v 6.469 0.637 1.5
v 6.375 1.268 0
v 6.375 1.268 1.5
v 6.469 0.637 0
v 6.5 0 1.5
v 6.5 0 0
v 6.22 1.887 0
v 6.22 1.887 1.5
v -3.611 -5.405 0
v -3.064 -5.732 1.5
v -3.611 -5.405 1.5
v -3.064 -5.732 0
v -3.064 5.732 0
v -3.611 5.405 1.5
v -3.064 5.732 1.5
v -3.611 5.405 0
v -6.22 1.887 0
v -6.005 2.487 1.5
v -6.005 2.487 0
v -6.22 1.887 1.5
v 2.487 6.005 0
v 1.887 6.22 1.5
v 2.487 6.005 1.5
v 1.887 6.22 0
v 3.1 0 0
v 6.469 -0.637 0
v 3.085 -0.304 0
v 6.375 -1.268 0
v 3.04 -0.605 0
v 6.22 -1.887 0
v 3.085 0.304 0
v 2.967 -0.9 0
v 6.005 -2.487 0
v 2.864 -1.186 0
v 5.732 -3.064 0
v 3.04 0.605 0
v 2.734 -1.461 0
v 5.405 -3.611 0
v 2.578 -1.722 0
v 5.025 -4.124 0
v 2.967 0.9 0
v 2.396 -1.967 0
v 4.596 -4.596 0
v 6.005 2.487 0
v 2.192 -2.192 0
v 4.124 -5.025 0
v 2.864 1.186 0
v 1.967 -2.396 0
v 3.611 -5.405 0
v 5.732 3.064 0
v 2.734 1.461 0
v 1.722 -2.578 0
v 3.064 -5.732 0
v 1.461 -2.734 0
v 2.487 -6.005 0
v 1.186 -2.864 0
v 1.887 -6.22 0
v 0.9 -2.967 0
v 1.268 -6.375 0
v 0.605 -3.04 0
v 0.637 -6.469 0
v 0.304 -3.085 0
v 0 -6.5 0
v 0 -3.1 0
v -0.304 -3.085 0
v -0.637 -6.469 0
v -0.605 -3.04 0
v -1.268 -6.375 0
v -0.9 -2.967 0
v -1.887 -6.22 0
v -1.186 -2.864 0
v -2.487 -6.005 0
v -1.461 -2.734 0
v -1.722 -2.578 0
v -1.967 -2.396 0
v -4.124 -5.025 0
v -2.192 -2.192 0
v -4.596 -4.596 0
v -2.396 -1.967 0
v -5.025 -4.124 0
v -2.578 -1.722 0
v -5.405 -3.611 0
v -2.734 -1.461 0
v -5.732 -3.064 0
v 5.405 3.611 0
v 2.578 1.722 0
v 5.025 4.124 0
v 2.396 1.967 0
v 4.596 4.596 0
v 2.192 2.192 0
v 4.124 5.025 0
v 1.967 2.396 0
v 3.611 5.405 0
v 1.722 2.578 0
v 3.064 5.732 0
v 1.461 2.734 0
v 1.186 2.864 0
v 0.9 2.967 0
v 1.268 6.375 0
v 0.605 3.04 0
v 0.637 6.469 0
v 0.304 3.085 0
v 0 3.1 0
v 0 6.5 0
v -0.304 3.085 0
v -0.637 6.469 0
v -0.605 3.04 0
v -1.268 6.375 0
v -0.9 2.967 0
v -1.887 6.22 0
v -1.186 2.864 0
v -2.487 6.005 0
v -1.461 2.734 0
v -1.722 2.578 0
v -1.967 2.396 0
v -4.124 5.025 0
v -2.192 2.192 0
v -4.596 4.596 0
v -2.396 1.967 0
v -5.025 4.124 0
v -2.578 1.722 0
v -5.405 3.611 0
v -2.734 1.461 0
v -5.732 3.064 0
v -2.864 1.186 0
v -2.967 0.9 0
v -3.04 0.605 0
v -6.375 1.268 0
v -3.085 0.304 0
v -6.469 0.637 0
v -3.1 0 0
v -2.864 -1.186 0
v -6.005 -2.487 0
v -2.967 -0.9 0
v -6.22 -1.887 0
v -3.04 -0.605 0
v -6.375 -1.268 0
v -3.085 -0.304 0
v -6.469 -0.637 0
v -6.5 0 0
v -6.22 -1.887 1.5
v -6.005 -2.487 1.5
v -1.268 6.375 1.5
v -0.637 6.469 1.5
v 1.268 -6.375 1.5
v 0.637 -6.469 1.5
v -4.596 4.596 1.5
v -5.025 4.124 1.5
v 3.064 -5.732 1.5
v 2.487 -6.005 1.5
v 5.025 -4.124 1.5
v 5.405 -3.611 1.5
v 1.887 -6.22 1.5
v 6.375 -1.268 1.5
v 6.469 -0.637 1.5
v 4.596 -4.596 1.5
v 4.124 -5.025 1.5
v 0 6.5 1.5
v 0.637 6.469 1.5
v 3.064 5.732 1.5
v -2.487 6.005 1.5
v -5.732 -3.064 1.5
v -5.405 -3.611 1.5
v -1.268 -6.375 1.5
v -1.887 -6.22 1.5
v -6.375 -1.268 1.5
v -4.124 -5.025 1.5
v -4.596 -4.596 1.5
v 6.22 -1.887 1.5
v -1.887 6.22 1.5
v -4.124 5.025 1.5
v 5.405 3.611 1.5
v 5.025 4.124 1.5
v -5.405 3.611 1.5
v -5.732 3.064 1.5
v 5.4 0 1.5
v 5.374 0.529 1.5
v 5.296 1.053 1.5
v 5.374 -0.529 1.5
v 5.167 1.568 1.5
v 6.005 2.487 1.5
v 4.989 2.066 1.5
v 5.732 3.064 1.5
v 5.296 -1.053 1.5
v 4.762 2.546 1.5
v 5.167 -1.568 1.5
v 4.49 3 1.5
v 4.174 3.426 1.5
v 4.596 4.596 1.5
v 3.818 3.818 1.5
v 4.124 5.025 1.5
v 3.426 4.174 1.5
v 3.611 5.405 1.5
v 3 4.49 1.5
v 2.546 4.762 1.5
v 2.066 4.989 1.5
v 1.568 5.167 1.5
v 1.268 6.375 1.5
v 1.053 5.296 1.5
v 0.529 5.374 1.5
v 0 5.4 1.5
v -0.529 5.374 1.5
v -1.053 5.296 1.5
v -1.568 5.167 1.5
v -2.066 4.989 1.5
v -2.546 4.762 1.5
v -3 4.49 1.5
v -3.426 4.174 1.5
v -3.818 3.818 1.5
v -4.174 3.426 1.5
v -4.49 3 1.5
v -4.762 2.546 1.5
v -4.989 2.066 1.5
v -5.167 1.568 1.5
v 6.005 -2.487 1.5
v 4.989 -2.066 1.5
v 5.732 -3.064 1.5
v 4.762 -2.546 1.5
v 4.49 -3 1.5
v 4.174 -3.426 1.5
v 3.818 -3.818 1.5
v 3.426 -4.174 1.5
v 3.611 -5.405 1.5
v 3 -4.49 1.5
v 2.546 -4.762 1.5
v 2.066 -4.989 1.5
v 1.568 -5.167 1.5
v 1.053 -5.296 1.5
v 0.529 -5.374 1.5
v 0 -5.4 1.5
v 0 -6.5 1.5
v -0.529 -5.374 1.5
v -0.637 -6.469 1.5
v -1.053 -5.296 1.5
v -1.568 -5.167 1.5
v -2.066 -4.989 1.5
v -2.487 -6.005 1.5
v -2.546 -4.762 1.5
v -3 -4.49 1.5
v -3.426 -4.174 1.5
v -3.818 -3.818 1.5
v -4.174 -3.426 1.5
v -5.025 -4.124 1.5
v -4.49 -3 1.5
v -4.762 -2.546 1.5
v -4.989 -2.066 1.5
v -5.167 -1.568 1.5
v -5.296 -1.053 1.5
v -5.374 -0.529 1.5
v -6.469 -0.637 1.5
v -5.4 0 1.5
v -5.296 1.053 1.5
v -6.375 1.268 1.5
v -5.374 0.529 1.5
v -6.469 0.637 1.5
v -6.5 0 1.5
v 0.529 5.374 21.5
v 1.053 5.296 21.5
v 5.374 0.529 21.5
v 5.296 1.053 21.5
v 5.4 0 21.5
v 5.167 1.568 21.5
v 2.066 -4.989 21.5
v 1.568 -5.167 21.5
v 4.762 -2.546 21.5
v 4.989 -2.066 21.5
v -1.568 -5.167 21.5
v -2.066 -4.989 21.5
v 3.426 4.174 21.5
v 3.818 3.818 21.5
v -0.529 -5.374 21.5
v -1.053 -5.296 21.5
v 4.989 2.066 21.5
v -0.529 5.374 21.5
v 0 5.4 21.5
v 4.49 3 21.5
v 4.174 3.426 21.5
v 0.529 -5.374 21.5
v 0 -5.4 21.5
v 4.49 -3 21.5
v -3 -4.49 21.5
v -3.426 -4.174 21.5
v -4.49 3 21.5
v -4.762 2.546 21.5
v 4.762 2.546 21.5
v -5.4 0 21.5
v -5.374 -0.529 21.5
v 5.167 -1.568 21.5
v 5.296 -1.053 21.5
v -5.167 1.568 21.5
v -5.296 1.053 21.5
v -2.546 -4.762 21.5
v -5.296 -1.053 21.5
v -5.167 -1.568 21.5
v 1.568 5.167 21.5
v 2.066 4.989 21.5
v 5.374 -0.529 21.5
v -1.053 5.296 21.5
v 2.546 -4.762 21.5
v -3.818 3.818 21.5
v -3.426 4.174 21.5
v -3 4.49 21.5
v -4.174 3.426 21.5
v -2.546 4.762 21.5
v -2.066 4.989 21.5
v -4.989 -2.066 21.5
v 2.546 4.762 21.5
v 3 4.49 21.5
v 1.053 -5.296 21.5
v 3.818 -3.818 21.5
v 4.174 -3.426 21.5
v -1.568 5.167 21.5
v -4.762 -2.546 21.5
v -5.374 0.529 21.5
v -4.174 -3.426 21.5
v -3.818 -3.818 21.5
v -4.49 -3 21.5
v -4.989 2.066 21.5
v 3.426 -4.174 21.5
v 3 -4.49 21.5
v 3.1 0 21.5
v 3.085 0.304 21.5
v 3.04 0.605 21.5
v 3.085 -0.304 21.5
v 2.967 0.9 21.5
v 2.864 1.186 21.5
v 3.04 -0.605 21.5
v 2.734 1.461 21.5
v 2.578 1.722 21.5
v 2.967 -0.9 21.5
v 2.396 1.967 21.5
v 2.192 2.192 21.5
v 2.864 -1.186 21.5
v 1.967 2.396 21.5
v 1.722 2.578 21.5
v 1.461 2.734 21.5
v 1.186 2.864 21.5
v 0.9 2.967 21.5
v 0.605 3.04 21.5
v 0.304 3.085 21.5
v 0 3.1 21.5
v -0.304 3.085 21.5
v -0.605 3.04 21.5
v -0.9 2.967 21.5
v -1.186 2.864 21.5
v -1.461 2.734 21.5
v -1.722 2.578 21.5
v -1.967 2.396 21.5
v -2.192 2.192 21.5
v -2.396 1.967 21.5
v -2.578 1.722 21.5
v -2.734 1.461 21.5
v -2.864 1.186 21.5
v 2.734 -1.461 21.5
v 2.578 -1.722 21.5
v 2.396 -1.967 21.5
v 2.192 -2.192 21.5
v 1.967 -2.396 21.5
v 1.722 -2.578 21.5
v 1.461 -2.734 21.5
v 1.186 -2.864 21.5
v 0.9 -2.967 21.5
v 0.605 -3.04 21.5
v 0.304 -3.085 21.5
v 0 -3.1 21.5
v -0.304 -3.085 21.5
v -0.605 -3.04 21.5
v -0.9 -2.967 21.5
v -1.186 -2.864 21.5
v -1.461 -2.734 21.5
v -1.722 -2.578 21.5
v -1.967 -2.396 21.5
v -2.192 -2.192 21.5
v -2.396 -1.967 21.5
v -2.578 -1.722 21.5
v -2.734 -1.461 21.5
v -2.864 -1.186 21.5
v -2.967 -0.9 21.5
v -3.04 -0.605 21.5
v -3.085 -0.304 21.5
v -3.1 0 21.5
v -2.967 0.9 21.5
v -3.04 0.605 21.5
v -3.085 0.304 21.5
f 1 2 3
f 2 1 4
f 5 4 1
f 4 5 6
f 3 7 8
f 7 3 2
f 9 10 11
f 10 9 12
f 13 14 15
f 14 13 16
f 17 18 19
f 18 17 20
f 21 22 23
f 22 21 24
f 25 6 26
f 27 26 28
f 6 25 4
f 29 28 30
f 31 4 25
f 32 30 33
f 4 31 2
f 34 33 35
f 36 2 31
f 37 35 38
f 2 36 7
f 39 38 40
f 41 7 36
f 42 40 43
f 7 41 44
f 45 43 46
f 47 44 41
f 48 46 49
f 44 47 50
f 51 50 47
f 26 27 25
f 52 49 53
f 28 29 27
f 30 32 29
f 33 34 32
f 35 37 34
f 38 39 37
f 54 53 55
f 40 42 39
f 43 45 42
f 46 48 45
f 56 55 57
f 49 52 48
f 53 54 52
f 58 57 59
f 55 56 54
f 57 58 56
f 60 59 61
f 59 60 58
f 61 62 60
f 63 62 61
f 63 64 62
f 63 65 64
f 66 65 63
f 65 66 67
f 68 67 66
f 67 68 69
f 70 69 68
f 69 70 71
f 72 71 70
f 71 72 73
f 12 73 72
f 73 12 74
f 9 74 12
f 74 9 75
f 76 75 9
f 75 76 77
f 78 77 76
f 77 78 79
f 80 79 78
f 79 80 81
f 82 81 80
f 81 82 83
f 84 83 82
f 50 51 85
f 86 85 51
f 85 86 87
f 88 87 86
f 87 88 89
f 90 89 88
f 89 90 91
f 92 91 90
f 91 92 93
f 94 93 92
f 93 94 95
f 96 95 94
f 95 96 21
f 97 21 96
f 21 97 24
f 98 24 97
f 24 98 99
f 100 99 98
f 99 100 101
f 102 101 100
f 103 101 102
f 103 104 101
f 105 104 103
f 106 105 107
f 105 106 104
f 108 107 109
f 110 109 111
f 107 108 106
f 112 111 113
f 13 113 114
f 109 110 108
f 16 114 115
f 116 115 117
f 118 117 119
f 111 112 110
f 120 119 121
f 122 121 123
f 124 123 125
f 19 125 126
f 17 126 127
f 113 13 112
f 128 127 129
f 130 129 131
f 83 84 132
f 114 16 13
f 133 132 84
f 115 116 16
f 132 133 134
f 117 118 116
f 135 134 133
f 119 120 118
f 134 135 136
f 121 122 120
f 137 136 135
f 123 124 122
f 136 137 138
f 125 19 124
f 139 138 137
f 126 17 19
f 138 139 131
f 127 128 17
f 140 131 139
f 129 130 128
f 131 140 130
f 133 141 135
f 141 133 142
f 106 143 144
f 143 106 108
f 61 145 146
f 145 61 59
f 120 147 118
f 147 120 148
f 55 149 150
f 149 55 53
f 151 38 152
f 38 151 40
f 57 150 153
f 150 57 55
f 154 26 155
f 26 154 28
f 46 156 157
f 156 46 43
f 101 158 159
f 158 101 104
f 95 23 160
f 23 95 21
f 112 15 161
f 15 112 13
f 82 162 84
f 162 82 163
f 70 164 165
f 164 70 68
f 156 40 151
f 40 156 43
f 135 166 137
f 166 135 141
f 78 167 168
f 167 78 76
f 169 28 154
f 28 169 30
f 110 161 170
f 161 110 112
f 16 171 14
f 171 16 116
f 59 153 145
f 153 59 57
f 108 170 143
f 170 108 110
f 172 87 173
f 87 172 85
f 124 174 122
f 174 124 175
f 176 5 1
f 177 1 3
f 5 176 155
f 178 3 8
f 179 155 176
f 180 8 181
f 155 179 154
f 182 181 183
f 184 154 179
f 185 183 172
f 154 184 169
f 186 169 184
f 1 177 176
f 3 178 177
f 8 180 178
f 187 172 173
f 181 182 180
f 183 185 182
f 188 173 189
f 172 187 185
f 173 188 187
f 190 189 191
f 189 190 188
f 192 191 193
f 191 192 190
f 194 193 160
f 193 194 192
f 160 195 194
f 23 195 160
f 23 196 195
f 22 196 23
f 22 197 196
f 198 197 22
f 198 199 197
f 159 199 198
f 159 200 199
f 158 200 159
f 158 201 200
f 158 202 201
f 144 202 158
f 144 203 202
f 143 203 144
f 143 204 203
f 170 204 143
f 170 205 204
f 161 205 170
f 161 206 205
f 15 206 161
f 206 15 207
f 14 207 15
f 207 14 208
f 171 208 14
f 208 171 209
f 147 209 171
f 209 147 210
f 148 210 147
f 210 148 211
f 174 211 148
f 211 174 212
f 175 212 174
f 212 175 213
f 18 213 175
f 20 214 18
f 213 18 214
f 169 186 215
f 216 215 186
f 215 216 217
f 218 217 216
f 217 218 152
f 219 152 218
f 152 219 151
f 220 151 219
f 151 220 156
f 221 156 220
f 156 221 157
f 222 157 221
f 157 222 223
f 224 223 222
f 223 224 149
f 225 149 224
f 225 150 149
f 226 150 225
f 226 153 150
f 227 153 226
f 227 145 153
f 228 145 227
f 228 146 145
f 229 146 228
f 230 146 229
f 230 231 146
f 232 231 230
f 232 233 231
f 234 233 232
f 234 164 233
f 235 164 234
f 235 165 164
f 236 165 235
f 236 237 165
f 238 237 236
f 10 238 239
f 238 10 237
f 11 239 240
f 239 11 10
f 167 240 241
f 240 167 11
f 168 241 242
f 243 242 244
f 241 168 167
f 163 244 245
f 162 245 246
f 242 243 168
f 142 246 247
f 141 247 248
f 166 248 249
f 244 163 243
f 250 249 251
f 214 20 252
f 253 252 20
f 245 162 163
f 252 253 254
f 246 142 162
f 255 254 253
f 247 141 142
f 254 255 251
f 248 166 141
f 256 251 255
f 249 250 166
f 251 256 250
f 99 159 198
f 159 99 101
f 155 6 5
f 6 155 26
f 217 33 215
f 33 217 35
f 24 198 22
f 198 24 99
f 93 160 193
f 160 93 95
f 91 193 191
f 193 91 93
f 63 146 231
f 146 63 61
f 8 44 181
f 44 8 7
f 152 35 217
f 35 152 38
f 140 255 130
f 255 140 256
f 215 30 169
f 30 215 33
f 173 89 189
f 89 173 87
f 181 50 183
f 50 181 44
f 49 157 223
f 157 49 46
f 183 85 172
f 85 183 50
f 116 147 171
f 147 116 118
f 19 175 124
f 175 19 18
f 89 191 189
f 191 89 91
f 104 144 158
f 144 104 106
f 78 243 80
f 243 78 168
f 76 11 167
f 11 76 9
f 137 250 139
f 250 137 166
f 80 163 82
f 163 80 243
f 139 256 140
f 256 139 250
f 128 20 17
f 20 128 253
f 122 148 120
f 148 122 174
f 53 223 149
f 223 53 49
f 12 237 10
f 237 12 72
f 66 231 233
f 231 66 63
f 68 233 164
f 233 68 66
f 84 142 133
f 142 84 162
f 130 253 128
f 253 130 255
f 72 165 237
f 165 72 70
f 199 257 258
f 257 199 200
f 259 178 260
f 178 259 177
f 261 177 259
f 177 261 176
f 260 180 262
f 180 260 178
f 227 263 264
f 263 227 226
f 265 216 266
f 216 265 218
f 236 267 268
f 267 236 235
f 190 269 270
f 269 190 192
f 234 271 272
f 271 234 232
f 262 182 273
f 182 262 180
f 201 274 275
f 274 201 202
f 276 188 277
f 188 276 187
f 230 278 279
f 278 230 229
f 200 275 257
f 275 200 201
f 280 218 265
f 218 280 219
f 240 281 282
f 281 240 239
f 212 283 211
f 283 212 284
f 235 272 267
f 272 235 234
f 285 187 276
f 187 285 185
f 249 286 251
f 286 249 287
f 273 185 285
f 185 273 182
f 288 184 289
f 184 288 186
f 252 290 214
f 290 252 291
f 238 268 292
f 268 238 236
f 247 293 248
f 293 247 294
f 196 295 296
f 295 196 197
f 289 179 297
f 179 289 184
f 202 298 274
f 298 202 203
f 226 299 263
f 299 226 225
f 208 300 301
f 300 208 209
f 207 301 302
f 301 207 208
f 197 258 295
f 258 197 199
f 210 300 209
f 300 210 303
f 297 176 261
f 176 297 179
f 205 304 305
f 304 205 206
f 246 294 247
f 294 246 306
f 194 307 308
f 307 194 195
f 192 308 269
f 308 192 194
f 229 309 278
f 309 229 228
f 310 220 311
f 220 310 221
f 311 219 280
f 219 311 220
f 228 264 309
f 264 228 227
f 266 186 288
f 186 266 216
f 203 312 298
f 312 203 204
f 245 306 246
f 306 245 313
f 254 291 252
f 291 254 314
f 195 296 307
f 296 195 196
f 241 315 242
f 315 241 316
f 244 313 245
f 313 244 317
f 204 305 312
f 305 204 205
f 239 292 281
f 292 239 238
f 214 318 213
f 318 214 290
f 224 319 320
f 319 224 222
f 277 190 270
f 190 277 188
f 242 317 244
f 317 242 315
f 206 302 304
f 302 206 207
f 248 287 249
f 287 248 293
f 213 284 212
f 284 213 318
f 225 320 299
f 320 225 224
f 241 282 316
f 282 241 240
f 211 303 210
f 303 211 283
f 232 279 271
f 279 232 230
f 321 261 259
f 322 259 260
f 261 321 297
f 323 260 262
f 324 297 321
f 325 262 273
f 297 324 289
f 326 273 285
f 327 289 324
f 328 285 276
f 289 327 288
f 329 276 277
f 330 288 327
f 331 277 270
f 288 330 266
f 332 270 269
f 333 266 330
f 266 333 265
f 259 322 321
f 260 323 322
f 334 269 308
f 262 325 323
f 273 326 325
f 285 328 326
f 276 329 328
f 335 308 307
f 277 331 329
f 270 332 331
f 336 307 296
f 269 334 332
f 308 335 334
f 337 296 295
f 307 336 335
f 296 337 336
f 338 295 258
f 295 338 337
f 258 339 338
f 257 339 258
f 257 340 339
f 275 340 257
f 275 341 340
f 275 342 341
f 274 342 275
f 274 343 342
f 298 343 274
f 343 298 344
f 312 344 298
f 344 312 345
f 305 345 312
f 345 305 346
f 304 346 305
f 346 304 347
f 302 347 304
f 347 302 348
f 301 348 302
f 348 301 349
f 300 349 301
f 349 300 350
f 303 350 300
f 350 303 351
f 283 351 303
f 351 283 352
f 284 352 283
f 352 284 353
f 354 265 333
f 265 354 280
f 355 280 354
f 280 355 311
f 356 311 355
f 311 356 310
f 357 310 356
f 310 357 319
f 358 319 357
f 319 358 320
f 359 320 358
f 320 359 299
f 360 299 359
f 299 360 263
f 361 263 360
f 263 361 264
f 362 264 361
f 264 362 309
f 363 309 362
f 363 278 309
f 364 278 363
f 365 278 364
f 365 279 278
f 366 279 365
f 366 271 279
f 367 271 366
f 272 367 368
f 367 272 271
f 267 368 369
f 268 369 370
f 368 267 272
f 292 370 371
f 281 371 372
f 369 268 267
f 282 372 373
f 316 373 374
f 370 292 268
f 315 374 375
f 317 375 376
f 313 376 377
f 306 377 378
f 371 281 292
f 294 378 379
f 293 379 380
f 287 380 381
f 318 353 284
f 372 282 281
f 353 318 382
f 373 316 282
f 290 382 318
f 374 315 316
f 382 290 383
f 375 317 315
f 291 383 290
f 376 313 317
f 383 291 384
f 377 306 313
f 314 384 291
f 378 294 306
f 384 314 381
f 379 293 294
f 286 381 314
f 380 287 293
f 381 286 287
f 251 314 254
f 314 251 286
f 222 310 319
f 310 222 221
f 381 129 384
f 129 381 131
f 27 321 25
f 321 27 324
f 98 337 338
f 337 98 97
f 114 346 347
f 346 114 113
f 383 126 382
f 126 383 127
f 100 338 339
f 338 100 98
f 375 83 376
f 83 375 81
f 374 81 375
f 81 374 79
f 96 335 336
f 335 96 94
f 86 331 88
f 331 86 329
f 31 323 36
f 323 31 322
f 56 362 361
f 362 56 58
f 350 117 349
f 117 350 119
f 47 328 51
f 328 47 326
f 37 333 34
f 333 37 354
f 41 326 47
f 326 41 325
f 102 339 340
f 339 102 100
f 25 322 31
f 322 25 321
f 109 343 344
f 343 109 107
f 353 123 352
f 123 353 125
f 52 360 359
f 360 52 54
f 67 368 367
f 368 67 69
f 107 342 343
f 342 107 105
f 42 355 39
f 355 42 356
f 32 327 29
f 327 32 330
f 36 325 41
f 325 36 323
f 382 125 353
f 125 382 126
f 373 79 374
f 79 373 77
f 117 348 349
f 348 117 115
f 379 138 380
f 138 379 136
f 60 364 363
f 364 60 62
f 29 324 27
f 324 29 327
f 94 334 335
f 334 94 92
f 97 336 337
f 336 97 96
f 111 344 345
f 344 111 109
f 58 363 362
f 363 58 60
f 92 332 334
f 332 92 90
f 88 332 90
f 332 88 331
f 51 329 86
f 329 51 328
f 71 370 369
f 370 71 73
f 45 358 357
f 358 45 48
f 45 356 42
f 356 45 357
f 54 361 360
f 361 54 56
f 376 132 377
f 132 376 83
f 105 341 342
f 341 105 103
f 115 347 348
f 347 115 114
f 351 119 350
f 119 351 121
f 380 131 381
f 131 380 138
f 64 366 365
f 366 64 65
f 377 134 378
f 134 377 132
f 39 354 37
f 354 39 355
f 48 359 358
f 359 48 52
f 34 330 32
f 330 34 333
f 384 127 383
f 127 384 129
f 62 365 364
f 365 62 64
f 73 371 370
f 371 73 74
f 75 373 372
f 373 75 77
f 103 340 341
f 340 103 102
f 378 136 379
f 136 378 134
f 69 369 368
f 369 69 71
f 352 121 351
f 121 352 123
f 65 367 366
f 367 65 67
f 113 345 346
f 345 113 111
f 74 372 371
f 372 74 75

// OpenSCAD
// Adapter sleeve for 0.2 mL PCR tube in 1.5 mL rack.
// Prints upside down: collar on bed (z=0 to 1.5), body rises to z=21.5.

// Dimensions
collar_od = 13;
collar_t  = 1.5;
body_od   = 10.8;
body_h    = 21.5;
bore_d    = 6.2;

$fn = 64;

// Build the part in the requested orientation:
// 1. Collar sits on XY plane (z=0 to z=1.5).
// 2. Body rises from the top of the collar (z=1.5) to z=21.5.
// 3. Bore runs through the full height.

difference() {
    union() {
        // --- Collar (on the bed) ---
        // Outer cylinder: 13mm diameter, 1.5mm height, centered on origin.
        translate([0, 0, 0]) 
            cylinder(h = collar_t, d = collar_od);
        
        // --- Body (rising from collar) ---
        // Outer cylinder: 10.8mm diameter, height from 1.5 to 21.5 (total 20mm).
        // Positioned so bottom is at z=1.5.
        translate([0, 0, collar_t]) 
            cylinder(h = body_h - collar_t, d = body_od);
    }
    
    // --- Bore ---
    // Hole running through the full height (0 to 21.5).
    // Extend slightly past the top to ensure clean cut.
    translate([0, 0, -1]) 
        cylinder(h = body_h + collar_t + 2, d = bore_d);
}
